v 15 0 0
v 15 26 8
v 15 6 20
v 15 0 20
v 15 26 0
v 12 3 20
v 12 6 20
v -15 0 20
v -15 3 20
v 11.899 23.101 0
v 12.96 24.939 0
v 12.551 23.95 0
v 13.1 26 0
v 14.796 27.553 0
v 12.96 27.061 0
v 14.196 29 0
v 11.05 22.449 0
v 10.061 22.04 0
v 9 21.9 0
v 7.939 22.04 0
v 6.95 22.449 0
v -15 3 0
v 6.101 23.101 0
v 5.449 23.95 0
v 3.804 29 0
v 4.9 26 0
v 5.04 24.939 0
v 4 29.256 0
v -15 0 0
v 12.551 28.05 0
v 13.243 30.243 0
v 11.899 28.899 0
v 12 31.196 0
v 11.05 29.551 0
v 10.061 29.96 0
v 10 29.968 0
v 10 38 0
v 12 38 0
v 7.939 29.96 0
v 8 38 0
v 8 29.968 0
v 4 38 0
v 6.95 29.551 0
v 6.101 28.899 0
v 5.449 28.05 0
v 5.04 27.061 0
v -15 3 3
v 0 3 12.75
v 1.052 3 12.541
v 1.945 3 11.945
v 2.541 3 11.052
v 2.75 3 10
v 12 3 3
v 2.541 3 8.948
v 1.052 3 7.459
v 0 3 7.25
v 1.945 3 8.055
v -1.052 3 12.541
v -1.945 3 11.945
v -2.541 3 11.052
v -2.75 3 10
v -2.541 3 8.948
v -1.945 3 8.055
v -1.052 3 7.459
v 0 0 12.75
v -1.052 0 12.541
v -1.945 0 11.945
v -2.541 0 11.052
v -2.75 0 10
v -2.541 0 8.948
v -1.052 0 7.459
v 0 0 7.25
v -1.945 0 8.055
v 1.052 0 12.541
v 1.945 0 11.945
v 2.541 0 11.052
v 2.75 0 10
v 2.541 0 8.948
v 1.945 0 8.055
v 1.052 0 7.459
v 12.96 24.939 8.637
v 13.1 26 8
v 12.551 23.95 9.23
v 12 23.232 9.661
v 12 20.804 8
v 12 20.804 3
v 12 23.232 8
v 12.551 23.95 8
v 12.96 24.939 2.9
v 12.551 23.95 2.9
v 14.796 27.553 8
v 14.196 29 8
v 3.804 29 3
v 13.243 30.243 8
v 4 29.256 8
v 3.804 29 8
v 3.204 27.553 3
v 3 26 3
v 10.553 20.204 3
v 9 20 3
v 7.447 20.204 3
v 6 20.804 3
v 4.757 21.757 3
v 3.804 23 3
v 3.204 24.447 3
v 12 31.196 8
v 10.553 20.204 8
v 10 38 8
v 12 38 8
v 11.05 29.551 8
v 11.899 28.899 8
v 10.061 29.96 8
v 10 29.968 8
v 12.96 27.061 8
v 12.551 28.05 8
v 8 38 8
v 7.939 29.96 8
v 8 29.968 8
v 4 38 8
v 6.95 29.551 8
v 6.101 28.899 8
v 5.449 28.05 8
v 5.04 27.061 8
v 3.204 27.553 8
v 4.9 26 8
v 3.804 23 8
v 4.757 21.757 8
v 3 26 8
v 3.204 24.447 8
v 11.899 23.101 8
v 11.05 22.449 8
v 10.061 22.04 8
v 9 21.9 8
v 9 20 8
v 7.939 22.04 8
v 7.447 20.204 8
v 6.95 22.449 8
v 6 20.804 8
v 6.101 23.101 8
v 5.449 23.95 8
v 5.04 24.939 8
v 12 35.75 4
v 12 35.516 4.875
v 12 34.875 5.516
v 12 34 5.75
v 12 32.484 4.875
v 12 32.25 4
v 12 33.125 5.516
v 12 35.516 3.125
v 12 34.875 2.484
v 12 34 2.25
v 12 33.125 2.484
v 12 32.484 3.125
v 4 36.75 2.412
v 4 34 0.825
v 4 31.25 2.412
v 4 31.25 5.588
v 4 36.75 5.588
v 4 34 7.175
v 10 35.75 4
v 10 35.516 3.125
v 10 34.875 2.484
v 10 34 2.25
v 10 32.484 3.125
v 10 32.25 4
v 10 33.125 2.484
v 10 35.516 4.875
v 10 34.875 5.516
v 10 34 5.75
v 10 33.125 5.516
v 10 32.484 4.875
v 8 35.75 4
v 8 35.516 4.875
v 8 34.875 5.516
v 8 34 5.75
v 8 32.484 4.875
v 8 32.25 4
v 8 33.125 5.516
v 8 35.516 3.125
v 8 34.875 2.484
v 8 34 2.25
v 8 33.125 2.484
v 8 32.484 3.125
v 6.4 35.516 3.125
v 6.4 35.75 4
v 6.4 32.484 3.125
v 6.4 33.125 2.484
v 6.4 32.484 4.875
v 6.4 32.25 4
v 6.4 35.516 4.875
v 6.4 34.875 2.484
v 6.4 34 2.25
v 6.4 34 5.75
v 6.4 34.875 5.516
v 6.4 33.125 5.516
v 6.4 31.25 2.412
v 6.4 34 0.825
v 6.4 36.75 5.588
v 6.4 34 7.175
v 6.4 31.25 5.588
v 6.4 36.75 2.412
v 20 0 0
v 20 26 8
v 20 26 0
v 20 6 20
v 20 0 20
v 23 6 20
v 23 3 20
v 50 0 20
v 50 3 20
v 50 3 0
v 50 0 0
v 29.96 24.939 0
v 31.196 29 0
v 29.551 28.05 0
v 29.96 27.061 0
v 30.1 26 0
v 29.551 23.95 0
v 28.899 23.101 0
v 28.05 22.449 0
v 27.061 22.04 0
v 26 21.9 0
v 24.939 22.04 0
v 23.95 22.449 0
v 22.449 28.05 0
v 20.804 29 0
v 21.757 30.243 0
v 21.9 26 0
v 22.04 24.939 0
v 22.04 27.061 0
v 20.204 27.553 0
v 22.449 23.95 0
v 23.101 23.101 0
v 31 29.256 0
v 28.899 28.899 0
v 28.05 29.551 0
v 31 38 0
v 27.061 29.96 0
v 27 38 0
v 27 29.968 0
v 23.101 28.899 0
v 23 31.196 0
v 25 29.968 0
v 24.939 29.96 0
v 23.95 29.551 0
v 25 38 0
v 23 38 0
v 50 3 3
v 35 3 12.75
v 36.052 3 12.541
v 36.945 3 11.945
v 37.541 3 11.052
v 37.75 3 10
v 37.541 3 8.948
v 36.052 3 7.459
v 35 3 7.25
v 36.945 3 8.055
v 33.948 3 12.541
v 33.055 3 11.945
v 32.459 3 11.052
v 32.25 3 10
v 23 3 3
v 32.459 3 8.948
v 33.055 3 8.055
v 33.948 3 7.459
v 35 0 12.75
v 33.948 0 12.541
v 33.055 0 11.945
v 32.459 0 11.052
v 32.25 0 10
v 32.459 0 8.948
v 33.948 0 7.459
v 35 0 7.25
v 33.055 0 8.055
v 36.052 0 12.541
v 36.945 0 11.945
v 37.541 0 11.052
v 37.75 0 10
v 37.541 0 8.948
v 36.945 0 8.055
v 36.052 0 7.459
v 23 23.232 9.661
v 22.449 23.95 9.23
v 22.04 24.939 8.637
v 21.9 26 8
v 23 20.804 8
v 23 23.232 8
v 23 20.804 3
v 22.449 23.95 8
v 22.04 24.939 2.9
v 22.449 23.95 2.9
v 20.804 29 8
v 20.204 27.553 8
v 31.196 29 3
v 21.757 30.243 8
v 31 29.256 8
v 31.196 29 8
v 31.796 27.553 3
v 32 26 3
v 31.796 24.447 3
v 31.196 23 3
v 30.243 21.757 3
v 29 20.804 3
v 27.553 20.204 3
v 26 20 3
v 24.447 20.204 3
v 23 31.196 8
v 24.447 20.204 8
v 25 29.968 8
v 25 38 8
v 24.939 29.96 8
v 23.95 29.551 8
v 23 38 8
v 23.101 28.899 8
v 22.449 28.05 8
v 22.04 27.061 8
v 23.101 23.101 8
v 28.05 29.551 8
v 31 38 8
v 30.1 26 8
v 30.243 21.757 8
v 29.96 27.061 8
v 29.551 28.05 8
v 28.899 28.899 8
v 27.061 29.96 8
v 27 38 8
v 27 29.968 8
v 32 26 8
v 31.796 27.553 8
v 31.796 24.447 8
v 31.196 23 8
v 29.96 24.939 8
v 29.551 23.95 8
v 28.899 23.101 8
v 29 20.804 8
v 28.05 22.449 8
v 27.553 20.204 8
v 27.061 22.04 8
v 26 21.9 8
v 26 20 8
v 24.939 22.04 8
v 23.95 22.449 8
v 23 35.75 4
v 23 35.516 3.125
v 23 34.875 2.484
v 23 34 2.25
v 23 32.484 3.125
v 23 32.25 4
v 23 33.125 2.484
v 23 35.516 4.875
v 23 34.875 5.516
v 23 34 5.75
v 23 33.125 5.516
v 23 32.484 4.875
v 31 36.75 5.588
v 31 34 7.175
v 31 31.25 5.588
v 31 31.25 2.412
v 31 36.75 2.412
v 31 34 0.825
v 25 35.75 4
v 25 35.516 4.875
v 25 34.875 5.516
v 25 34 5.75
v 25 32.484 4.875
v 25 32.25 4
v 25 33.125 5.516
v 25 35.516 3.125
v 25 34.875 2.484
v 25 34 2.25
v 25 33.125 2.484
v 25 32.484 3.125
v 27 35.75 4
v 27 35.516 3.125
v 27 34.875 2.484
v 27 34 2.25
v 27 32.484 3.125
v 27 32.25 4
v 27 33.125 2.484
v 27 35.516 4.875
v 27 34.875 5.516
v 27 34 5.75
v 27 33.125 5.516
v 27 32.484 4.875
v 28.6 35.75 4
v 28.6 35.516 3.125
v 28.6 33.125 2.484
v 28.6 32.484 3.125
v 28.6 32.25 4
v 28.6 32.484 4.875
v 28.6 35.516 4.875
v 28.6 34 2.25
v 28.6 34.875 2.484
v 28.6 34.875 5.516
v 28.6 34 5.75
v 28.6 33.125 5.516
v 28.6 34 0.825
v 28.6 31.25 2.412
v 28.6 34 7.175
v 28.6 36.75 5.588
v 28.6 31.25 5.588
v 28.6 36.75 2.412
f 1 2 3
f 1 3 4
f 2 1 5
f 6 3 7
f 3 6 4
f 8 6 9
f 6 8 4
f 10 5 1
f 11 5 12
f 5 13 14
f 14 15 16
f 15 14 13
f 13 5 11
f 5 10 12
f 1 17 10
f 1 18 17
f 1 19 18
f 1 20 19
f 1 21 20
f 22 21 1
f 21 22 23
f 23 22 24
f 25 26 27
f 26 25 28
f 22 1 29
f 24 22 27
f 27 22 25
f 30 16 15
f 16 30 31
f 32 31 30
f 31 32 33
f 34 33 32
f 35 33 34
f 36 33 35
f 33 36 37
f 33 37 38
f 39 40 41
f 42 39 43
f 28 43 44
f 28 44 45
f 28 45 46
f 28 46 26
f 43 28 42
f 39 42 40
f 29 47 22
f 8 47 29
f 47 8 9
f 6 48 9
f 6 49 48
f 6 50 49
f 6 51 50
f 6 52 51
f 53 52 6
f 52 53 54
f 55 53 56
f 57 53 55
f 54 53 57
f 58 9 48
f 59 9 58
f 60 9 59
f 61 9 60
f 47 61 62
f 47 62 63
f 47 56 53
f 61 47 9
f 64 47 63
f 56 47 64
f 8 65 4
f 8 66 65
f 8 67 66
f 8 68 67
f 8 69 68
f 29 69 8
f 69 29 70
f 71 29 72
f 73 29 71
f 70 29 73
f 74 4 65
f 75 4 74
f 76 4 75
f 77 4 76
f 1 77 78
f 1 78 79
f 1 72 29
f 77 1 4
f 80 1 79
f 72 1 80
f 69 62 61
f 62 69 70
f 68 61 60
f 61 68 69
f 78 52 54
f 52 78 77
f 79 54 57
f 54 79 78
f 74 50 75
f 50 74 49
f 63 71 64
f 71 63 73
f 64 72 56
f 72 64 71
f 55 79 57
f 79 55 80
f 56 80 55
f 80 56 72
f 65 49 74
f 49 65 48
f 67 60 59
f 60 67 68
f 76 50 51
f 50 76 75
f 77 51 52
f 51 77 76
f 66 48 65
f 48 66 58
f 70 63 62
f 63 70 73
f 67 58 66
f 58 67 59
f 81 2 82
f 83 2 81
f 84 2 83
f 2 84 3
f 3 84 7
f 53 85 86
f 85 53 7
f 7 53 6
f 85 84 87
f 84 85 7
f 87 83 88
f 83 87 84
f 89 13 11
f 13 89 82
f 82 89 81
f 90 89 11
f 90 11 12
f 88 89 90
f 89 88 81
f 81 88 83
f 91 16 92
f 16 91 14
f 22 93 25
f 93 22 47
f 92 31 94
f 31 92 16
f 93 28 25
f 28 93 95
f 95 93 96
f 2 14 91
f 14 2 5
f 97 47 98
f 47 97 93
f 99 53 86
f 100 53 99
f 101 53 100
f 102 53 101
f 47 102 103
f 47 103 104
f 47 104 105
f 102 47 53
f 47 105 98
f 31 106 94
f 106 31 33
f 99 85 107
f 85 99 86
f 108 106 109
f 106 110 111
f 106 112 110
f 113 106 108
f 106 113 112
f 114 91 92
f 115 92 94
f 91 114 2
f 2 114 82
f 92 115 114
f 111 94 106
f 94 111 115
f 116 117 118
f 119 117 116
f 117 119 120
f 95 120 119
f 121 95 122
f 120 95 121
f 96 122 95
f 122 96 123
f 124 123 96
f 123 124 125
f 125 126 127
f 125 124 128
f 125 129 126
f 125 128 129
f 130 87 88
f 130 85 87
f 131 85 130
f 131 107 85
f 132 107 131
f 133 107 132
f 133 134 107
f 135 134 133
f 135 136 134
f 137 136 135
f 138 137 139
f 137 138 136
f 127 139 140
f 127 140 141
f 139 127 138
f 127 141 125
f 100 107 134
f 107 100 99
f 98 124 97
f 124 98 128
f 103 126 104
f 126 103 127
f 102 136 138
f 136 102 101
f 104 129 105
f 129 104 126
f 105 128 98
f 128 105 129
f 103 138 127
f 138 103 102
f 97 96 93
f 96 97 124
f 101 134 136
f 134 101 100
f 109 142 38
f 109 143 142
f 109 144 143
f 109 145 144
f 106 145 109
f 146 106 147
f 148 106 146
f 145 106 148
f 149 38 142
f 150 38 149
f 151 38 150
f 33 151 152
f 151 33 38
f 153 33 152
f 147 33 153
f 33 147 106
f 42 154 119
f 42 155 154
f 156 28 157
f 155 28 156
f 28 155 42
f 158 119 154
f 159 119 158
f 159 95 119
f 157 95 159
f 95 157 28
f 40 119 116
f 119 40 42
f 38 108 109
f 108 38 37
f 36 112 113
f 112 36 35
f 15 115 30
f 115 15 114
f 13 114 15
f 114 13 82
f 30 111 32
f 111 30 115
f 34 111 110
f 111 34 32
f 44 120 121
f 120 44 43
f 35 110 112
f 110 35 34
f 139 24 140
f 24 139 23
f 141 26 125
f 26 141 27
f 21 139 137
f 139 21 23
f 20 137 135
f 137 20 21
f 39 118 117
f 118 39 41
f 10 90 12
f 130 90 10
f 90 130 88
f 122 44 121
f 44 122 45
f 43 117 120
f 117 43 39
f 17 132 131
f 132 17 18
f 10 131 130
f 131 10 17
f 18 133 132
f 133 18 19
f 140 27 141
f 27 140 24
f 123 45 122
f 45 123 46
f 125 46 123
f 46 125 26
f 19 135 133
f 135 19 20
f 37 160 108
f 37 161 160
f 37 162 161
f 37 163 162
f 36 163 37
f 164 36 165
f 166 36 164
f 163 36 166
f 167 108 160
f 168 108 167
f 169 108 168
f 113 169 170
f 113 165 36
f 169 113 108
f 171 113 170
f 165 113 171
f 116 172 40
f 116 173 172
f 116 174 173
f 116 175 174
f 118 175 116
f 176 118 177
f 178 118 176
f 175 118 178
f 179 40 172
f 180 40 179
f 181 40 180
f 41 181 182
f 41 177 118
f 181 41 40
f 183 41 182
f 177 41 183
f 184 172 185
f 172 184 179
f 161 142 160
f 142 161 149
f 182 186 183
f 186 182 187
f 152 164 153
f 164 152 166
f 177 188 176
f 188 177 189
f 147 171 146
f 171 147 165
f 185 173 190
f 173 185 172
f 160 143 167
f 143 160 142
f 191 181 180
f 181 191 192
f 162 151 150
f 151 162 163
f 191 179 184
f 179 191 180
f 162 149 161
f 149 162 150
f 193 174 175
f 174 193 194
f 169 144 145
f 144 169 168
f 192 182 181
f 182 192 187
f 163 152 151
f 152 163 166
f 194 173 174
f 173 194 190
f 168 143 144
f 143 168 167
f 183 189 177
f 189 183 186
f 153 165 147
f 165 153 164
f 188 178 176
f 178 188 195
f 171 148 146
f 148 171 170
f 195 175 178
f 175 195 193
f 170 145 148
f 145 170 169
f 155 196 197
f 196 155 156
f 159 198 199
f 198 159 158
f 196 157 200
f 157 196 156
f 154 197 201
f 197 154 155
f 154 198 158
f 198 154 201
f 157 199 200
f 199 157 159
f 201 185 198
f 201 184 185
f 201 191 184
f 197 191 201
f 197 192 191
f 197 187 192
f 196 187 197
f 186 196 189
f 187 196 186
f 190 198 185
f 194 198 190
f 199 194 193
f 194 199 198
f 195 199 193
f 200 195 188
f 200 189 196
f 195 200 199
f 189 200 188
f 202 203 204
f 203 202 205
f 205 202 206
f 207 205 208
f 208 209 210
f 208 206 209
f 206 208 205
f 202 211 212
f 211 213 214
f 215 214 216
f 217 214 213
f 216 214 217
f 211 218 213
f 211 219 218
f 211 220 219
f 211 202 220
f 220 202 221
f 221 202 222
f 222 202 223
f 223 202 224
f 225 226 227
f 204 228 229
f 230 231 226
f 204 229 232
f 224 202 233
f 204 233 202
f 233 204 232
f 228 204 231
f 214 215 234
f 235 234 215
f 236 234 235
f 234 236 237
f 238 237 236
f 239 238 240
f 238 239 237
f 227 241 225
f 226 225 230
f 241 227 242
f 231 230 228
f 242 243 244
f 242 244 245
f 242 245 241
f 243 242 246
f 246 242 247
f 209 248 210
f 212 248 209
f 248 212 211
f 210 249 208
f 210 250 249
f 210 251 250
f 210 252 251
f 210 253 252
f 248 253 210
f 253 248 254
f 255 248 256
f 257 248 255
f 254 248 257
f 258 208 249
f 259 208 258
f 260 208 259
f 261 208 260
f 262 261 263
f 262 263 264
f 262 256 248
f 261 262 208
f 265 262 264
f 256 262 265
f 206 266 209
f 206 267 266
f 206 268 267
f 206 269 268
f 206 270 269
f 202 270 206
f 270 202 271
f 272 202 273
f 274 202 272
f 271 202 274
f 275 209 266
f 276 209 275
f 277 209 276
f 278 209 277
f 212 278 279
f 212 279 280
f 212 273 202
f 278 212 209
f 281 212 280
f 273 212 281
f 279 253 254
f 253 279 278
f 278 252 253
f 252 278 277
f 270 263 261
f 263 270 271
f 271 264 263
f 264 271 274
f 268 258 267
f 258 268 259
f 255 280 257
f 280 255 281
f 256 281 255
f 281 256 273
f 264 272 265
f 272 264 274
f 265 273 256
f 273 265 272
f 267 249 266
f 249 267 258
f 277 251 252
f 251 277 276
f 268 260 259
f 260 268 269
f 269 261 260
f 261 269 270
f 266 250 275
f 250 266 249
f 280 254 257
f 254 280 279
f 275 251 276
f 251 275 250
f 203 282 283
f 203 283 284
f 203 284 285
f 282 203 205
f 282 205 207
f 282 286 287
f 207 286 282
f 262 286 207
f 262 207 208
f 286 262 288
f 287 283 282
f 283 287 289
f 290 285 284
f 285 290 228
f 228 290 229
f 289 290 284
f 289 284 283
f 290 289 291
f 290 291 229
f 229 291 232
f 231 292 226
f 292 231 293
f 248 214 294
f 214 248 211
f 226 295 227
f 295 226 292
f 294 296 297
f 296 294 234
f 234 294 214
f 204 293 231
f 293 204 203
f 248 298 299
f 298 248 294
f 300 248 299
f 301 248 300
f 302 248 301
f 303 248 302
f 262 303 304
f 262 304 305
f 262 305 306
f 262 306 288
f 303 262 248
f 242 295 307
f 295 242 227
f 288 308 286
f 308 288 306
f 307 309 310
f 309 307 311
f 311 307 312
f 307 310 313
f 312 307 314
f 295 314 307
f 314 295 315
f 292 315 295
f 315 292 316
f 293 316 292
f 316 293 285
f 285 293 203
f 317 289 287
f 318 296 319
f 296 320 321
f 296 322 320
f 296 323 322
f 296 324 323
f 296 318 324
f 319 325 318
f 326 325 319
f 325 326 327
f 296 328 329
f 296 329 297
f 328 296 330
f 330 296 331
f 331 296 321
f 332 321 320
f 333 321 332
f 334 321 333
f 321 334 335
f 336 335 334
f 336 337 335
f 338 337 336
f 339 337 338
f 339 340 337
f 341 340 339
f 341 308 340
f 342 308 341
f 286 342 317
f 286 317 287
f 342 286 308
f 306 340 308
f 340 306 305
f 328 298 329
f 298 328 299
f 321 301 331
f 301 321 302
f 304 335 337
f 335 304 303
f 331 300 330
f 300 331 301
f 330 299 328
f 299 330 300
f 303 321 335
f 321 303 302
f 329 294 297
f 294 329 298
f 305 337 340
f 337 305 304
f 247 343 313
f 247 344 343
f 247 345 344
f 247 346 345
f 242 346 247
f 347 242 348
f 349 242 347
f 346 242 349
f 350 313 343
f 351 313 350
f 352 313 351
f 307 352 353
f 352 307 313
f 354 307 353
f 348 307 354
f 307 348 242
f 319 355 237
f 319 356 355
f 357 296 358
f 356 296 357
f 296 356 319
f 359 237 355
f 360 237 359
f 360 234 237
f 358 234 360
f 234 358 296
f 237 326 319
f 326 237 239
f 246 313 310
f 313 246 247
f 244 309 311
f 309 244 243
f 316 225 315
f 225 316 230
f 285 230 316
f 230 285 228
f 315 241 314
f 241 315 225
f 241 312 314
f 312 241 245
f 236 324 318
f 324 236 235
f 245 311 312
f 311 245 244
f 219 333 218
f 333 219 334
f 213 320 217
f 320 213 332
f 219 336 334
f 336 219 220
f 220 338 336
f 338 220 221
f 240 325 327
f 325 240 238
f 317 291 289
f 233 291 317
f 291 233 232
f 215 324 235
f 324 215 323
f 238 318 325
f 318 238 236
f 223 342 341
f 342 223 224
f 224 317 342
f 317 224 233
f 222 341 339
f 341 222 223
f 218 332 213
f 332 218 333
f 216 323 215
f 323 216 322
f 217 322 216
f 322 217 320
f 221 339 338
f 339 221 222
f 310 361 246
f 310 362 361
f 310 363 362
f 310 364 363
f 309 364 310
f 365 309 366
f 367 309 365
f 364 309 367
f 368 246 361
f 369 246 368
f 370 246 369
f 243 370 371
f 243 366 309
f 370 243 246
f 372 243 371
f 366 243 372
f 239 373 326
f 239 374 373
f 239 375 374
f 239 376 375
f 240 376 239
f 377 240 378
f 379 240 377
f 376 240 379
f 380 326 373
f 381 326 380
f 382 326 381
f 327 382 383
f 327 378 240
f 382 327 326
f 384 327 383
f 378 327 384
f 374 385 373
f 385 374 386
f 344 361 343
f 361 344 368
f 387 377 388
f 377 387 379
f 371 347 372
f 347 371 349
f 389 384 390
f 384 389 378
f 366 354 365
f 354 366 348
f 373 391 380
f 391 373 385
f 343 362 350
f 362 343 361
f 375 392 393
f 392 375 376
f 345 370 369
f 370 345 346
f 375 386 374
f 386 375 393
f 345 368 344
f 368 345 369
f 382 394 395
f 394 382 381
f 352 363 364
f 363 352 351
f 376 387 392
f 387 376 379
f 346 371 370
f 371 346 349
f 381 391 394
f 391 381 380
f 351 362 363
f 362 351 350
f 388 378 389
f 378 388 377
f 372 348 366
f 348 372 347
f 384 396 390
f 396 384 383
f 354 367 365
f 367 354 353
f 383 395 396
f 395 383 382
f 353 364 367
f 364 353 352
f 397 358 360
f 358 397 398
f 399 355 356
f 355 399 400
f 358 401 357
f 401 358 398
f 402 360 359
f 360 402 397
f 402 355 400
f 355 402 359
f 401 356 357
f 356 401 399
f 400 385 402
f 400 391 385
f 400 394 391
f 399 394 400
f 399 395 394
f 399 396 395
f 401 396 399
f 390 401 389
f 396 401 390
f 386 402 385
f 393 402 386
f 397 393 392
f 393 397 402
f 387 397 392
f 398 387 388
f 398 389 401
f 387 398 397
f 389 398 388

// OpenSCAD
// file: modules.scad
// Fonctions personnalisées

//http://forum.openscad.org/Wish-mirror-copy-true-td10681.html
module copy_mirror(vec=[0,1,0])
{
    children();
    mirror(vec) children();
}

module ecrou(plat,h){
  cylinder(d=plat*2/sqrt(3), h=h, $fn=6);
}


module courroie(diam,longueur){
  color ("black")
  difference(){
    hull(){
      cylinder(d=diam+1, h=6, $fn=32);
      translate([longueur,0,0]) cylinder(d=diam+1, h=6, $fn=32);
    }
    translate([0,0,-1])
    hull(){
      cylinder(d=diam-1, h=8, $fn=32);
      translate([longueur,0,0]) cylinder(d=diam-1, h=8, $fn=32);
    }
  }
  
  
}
// file: config.scad
// Paramètres de la machine

decal=-30;            // décallage du chassis xz
hauteur=400;          // hauteur totale chassis
largeur=400;          // largeur totale chassis
longueur=470;         // longueur totale chassis
hauteur_base=90;      // hauteur de la base
entraxe_y=140;        // distance entre les tiges Ø8 axe Y
entraxe_x=45;         // distance entre les tiges Ø8 axe X

couleur=[1,0.6,0];



// Paramètre des pièces et jeux

// écart plateau/courroie
// y_belt_holder
belt_h=13;      // écart entre la courroie et le plateau

// écart plateau/tiges lisses
// y_lm8uu
decal_plateau=12; // Décallage en Y

// décallage des tiges lisses Y
// support_tige8_y
decal_tiges=5;

// décallage moteur Y
// y_motor
decal_motory_z=11;
decal_motory_y=25;

// Equerres de fixation position fermée
eq_ec=10;      // écart entre profilés

// Fixations axe Z
pos_z=26;      // position des axes par rapport au profilé (>= 21)
hauteur_z=20;  // hauteur des fixations
entraxe_z=17;  // distance entre les tiges Ø8 et M5
// est ce que la tige de 8 dépasse du profilé de 30?
// si oui, on décale les fixations
decalx=max(-42/2+entraxe_z+8/2+2, 0);

// Roulements linéaires
lbd = 15; // diamètre ext
lbh = 24; // hauteur

// x_carriage
he_x=23;  // entraxe hotend x
he_y=23;  // entraxe hotend y
sen_x=13; // entraxe capteur x
sen_y=23; // entraxe capteur y

// Plats écrous
ec3=5.7;
ec4=7.2;
ec5=8.2;
ec6=10.2;

// Jeu sur plats pour les écrous glissants
jec=0.2;

// hauteur écrous
ec3h=2.4;
ec4h=3.2;
ec5h=4.7;
ec6h=5.2;

// Vis
vis3=3.5;
vis4=4.5;
vis5=5.5;
vis6=6.5;

// nombre de dents des poulies
poulie=20;

// Pas des courroies
pas=2;

// diamètre des poulies
dpoulie=poulie*pas/3.1416;
// main file
// eLKa1
// z_axis_top
// GNU GPL v3
// lkiefer <blog.lkiefer.org> and contributors
// http://www.reprap.org/wiki/ELKa
// https://github.com/kimented/elka1

include <config.scad>;
use <modules.scad>;

module z_axis_top_l(){
  ep=3;
  
  color(couleur) translate([-42/2+30/2,pos_z,0]){
    // fixation face
    difference(){
      translate([-(30-42/2),-pos_z,0]) cube([30,ep,hauteur_z]);
      translate([42/2-30/2, -pos_z-1,hauteur_z/2]) rotate([-90,0,0]) cylinder(h=ep+2, d=vis5, $fn=16);
    }
    // fixation coté
    /*difference(){
      translate([42/2-30,-pos_z-30,0]) cube([ep,30,hauteur_z]);
      translate([42/2-30-1,-pos_z-30/2,hauteur_z/2]) rotate([0,90,0]) cylinder(d=vis5, h=ep+2, $fn=16);}*/
    // nervure
    translate([42/2-ep,0,0])
    difference(){
      hull(){
        translate([0,-1,0]) cube([ep,1,ep+5]);
        translate([0,-pos_z+ep,0]) cube([ep,ep,hauteur_z]);
      }
      translate([-1,-pos_z-1,-1.1]) cube([ep+2, 42/2+pos_z+2, ep+1]);
      // trou tige
      translate([-42/2+ep+entraxe_z-decalx,0,-1]) cylinder(d=8.2, h=hauteur_z+2, $fn=24);
    }
    // tige 8
    translate([entraxe_z,0,0]){
      difference(){
        union(){
          hull(){
            translate([-decalx,0,0]) cylinder(d=8+2*2, h=ep, $fn=24);
            translate([-(30-42/2)-entraxe_z,-pos_z,0]) cube([30,ep,ep]);
          }
          translate([-decalx,0,0]) cylinder(d=8+2*2, h=8, $fn=24);
          translate([-5-decalx,0,0]) cube([8,8/2+8,ep+5],convexity=15);
        }
        // trou tige
        translate([-decalx,0,-1]) cylinder(d=8.2, h=8+2, $fn=24);
        // rainure
        translate([-1-decalx,-1,-1]) cube([2,8/2+8+2,ep+5+2]);
        // vis
        translate([-10-decalx,8,4]) rotate([0,90,0]) cylinder(h=20, d=vis3, $fn=12);
        translate([-5+-1-decalx,8,4]) rotate([0,90,0]) ecrou(5.5, ec3h+1);
      }
    }
  }
}

module z_axis_top_r(){
  mirror([1,0,0]) z_axis_top_l();
}

z_axis_top_l();
translate([35,0,0]) z_axis_top_r();
